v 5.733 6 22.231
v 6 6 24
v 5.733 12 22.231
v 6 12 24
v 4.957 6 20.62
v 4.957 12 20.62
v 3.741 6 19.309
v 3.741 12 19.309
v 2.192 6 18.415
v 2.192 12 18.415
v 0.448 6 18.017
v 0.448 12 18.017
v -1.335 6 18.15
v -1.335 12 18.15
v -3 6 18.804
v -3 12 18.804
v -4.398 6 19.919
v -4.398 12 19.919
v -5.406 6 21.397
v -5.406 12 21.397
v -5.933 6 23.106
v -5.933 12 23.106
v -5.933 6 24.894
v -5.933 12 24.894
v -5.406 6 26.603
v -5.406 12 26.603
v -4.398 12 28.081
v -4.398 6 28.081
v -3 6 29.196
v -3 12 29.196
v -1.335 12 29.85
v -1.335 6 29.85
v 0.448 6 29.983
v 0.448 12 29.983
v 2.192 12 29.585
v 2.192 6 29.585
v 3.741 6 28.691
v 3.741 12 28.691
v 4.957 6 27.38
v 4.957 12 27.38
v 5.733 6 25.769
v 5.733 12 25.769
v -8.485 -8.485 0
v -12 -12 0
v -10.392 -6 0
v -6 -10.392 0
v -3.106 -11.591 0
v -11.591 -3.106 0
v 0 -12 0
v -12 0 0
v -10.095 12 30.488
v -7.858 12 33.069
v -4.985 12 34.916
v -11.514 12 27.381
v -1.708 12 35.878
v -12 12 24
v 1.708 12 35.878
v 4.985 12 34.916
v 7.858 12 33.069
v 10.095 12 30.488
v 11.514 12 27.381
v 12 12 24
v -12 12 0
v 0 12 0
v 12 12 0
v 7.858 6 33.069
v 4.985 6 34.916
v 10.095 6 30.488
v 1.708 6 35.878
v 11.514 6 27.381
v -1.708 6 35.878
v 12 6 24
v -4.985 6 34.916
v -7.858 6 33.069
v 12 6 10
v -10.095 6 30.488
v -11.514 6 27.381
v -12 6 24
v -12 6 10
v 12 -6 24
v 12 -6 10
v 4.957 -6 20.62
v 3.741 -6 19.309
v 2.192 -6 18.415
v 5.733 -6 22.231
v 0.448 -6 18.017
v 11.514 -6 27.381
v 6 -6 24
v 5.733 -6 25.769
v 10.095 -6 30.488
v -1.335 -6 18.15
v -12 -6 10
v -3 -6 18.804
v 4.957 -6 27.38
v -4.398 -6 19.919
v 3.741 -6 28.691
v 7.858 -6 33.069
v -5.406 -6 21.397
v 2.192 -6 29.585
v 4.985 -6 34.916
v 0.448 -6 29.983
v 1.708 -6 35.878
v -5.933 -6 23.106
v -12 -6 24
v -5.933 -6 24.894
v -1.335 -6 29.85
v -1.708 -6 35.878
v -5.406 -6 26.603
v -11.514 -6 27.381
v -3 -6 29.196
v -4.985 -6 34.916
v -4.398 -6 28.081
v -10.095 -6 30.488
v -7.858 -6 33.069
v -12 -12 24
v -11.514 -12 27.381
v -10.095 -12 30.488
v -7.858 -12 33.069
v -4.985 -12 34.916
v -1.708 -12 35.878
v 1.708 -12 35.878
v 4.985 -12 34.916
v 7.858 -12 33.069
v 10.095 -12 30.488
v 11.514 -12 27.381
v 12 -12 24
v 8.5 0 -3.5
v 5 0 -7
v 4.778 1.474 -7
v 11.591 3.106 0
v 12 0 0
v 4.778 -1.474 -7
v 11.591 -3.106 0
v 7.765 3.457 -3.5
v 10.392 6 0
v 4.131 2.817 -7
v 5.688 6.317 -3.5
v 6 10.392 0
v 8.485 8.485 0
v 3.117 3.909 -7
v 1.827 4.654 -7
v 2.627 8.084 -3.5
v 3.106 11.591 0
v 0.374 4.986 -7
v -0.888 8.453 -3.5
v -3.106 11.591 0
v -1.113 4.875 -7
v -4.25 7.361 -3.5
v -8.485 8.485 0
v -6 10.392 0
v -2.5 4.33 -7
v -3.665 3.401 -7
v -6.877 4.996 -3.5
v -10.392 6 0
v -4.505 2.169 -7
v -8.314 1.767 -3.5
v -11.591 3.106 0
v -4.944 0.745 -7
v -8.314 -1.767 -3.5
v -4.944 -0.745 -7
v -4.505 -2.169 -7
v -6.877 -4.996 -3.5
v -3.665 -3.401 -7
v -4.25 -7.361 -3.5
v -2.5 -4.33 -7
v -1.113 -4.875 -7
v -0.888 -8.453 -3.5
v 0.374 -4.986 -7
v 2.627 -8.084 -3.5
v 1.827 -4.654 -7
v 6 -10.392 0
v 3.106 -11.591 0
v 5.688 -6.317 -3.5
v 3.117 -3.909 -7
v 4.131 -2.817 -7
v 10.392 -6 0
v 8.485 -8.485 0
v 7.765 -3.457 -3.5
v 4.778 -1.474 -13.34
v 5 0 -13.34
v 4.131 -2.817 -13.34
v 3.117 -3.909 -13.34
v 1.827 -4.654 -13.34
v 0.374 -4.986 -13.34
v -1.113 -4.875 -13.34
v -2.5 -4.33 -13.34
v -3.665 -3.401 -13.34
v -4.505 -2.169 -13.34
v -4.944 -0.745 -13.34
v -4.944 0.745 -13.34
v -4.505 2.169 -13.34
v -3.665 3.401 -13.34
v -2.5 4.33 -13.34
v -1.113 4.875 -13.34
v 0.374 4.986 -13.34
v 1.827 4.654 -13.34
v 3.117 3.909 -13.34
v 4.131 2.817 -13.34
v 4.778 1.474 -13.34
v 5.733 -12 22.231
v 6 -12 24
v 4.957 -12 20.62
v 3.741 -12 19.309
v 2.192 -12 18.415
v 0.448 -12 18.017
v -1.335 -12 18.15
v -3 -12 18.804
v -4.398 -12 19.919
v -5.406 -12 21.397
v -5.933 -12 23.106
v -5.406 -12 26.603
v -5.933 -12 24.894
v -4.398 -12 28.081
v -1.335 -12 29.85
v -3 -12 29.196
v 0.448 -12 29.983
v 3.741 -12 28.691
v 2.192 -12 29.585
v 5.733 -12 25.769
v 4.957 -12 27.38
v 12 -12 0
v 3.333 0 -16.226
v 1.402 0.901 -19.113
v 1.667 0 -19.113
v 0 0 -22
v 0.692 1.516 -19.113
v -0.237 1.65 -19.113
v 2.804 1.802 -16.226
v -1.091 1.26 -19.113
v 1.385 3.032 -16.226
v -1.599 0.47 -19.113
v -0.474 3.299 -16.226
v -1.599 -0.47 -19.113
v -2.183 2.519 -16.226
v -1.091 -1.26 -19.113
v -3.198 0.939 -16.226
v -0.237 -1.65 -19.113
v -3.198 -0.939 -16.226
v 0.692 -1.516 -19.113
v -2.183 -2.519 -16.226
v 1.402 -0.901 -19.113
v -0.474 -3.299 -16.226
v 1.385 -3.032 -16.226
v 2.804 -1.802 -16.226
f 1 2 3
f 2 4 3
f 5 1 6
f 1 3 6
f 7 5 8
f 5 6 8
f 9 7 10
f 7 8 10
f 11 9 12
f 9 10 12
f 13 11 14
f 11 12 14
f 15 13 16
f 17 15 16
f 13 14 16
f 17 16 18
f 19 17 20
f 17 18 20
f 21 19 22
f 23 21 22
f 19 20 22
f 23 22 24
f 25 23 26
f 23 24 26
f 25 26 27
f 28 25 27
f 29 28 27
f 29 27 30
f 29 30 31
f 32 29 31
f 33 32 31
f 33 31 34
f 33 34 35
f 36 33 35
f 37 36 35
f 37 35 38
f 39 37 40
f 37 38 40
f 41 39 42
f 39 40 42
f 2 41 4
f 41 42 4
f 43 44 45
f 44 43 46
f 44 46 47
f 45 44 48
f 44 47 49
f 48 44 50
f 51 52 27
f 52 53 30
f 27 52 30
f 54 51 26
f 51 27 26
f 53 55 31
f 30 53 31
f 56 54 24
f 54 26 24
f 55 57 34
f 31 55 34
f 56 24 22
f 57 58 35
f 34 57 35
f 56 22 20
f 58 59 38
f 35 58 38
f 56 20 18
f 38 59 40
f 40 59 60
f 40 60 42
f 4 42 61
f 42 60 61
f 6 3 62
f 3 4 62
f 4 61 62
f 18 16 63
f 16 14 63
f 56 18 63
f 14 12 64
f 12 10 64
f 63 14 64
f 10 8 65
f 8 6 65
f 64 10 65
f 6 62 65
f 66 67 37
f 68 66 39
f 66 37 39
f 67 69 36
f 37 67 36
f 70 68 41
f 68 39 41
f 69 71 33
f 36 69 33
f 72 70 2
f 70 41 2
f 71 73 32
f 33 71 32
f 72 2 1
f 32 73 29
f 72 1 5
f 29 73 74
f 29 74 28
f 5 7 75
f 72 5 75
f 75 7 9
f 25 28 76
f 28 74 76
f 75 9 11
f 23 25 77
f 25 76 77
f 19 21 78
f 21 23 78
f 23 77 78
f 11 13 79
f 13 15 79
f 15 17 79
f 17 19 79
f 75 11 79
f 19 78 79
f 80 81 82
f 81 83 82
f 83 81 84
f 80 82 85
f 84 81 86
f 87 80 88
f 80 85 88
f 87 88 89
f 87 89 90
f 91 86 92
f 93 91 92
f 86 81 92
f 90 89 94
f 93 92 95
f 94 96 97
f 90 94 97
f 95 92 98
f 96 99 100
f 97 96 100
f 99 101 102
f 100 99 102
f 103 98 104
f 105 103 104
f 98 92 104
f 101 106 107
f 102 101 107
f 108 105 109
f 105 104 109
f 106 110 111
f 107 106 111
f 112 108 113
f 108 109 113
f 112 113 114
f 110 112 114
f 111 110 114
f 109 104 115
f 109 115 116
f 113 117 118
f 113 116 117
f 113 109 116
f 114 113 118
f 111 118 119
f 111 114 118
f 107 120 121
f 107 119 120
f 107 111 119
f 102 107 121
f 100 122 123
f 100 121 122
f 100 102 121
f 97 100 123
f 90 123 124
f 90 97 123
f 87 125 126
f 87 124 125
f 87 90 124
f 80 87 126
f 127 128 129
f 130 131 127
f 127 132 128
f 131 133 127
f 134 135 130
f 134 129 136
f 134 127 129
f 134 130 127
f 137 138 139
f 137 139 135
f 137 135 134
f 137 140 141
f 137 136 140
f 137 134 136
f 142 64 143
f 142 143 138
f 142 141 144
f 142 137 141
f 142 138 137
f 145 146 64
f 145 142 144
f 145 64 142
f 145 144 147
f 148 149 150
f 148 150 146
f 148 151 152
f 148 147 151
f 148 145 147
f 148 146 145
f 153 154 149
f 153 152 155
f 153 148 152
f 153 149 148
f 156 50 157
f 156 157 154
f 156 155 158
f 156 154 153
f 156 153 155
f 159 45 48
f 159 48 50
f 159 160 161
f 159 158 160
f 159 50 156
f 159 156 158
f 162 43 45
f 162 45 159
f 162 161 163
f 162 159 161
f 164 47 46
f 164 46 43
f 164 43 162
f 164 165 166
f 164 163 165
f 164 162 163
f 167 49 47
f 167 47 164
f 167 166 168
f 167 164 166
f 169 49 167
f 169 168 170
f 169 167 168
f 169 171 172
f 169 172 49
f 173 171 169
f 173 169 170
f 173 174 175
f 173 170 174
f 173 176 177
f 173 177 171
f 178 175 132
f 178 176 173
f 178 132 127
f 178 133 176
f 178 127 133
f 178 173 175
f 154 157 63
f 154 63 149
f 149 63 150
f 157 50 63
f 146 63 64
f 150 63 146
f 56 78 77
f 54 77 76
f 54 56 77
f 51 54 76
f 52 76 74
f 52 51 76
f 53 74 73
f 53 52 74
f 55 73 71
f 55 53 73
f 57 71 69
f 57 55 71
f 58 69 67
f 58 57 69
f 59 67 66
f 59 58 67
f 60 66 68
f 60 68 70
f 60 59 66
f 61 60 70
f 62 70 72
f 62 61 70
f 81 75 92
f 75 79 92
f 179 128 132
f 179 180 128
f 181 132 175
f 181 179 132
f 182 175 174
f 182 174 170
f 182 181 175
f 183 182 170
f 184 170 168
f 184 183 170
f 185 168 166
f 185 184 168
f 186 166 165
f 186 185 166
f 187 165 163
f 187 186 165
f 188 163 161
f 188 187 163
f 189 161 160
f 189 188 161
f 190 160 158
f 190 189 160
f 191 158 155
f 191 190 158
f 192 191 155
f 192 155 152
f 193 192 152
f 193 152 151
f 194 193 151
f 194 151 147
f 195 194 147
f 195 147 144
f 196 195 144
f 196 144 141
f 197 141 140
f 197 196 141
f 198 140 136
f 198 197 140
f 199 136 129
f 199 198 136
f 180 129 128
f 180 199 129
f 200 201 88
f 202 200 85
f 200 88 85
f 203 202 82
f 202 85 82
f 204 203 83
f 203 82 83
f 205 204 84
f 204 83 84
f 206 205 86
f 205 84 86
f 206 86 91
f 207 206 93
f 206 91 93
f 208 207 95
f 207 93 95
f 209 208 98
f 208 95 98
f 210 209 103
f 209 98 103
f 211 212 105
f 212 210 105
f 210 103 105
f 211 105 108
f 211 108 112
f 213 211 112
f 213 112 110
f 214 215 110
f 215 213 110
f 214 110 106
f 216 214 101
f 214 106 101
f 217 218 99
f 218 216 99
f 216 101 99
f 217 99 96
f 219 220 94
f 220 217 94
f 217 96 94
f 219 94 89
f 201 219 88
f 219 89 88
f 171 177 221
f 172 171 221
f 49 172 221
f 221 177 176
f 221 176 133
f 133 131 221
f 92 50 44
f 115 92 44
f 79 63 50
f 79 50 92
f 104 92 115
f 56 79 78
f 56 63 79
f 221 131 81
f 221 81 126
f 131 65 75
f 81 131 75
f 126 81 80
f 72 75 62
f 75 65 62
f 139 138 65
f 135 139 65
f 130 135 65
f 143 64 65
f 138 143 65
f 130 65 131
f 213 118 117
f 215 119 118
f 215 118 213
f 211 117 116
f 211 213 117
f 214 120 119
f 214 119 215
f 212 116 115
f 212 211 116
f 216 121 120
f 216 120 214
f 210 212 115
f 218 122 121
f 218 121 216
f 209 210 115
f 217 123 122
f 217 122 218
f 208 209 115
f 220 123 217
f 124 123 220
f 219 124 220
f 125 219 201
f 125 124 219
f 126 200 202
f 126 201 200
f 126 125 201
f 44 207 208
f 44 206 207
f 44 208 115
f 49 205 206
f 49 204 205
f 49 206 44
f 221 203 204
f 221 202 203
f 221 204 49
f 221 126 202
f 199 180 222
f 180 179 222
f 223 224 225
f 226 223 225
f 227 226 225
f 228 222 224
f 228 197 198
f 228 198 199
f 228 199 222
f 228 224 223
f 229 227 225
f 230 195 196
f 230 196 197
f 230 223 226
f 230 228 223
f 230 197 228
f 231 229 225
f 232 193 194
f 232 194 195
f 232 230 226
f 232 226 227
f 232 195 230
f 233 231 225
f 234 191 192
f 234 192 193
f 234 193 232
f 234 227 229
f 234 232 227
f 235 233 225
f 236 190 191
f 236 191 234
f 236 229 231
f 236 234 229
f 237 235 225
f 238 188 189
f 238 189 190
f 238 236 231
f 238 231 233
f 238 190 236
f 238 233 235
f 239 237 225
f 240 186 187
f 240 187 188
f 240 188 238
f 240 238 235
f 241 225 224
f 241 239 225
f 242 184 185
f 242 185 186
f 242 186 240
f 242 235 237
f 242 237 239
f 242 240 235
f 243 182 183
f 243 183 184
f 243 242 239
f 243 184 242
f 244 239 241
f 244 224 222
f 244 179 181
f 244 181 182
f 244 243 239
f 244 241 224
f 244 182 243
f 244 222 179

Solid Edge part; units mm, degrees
sketch "Sketch1" plane through (0, 0, 0) normal (0, -1, 0) x (1, 0, 0)
  line L0 (-12, 0) -> (12, 0)
  line L1 (12, 0) -> (12, 24)
  line L2 (-12, 0) -> (-12, 24)
  arc A0 (12, 24) -> (-12, 24) centre (0, 24) ccw
  circle A1 centre (0, 24) radius 6
  dimension "D1" = 24
  dimension "D2" = 24
extrude "Protrusion1" add sketch "Sketch1" along normal mid plane 24
sketch "Sketch2" plane through (12, 0, 12) normal (1, 0, 0) x (0, 1, 0)
  line L0 (-6, 24) -> (6, 24)
  line L1 (6, 24) -> (6, -2)
  line L2 (6, -2) -> (-6, -2)
  line L3 (-6, -2) -> (-6, 24)
  dimension "D1" = 10
  dimension "D2" = 12
extrude "ExtrudedCutout_1" cut sketch "Sketch2" along normal mid plane 367.3731
sketch "Sketch3" plane through (0, 0, 0) normal (0, -1, 0) x (1, 0, 0)
  line L0 (12, 0) -> (0, 0)
  line L1 (5, -13.3397) -> (0, -22)
  line L2 (5, -7) -> (5, -13.3397)
  line L3 (12, 0) -> (5, -7)
  dimension "D1" = 46
  dimension "D2" = 15
  dimension "D3" = 5
revolve "RevolvedProtrusion1" add sketch "Sketch3" angle 360 about axis through (0, 0, 0) along (0, 0, -1)
properties part number "12" material "Fe 410 W"
